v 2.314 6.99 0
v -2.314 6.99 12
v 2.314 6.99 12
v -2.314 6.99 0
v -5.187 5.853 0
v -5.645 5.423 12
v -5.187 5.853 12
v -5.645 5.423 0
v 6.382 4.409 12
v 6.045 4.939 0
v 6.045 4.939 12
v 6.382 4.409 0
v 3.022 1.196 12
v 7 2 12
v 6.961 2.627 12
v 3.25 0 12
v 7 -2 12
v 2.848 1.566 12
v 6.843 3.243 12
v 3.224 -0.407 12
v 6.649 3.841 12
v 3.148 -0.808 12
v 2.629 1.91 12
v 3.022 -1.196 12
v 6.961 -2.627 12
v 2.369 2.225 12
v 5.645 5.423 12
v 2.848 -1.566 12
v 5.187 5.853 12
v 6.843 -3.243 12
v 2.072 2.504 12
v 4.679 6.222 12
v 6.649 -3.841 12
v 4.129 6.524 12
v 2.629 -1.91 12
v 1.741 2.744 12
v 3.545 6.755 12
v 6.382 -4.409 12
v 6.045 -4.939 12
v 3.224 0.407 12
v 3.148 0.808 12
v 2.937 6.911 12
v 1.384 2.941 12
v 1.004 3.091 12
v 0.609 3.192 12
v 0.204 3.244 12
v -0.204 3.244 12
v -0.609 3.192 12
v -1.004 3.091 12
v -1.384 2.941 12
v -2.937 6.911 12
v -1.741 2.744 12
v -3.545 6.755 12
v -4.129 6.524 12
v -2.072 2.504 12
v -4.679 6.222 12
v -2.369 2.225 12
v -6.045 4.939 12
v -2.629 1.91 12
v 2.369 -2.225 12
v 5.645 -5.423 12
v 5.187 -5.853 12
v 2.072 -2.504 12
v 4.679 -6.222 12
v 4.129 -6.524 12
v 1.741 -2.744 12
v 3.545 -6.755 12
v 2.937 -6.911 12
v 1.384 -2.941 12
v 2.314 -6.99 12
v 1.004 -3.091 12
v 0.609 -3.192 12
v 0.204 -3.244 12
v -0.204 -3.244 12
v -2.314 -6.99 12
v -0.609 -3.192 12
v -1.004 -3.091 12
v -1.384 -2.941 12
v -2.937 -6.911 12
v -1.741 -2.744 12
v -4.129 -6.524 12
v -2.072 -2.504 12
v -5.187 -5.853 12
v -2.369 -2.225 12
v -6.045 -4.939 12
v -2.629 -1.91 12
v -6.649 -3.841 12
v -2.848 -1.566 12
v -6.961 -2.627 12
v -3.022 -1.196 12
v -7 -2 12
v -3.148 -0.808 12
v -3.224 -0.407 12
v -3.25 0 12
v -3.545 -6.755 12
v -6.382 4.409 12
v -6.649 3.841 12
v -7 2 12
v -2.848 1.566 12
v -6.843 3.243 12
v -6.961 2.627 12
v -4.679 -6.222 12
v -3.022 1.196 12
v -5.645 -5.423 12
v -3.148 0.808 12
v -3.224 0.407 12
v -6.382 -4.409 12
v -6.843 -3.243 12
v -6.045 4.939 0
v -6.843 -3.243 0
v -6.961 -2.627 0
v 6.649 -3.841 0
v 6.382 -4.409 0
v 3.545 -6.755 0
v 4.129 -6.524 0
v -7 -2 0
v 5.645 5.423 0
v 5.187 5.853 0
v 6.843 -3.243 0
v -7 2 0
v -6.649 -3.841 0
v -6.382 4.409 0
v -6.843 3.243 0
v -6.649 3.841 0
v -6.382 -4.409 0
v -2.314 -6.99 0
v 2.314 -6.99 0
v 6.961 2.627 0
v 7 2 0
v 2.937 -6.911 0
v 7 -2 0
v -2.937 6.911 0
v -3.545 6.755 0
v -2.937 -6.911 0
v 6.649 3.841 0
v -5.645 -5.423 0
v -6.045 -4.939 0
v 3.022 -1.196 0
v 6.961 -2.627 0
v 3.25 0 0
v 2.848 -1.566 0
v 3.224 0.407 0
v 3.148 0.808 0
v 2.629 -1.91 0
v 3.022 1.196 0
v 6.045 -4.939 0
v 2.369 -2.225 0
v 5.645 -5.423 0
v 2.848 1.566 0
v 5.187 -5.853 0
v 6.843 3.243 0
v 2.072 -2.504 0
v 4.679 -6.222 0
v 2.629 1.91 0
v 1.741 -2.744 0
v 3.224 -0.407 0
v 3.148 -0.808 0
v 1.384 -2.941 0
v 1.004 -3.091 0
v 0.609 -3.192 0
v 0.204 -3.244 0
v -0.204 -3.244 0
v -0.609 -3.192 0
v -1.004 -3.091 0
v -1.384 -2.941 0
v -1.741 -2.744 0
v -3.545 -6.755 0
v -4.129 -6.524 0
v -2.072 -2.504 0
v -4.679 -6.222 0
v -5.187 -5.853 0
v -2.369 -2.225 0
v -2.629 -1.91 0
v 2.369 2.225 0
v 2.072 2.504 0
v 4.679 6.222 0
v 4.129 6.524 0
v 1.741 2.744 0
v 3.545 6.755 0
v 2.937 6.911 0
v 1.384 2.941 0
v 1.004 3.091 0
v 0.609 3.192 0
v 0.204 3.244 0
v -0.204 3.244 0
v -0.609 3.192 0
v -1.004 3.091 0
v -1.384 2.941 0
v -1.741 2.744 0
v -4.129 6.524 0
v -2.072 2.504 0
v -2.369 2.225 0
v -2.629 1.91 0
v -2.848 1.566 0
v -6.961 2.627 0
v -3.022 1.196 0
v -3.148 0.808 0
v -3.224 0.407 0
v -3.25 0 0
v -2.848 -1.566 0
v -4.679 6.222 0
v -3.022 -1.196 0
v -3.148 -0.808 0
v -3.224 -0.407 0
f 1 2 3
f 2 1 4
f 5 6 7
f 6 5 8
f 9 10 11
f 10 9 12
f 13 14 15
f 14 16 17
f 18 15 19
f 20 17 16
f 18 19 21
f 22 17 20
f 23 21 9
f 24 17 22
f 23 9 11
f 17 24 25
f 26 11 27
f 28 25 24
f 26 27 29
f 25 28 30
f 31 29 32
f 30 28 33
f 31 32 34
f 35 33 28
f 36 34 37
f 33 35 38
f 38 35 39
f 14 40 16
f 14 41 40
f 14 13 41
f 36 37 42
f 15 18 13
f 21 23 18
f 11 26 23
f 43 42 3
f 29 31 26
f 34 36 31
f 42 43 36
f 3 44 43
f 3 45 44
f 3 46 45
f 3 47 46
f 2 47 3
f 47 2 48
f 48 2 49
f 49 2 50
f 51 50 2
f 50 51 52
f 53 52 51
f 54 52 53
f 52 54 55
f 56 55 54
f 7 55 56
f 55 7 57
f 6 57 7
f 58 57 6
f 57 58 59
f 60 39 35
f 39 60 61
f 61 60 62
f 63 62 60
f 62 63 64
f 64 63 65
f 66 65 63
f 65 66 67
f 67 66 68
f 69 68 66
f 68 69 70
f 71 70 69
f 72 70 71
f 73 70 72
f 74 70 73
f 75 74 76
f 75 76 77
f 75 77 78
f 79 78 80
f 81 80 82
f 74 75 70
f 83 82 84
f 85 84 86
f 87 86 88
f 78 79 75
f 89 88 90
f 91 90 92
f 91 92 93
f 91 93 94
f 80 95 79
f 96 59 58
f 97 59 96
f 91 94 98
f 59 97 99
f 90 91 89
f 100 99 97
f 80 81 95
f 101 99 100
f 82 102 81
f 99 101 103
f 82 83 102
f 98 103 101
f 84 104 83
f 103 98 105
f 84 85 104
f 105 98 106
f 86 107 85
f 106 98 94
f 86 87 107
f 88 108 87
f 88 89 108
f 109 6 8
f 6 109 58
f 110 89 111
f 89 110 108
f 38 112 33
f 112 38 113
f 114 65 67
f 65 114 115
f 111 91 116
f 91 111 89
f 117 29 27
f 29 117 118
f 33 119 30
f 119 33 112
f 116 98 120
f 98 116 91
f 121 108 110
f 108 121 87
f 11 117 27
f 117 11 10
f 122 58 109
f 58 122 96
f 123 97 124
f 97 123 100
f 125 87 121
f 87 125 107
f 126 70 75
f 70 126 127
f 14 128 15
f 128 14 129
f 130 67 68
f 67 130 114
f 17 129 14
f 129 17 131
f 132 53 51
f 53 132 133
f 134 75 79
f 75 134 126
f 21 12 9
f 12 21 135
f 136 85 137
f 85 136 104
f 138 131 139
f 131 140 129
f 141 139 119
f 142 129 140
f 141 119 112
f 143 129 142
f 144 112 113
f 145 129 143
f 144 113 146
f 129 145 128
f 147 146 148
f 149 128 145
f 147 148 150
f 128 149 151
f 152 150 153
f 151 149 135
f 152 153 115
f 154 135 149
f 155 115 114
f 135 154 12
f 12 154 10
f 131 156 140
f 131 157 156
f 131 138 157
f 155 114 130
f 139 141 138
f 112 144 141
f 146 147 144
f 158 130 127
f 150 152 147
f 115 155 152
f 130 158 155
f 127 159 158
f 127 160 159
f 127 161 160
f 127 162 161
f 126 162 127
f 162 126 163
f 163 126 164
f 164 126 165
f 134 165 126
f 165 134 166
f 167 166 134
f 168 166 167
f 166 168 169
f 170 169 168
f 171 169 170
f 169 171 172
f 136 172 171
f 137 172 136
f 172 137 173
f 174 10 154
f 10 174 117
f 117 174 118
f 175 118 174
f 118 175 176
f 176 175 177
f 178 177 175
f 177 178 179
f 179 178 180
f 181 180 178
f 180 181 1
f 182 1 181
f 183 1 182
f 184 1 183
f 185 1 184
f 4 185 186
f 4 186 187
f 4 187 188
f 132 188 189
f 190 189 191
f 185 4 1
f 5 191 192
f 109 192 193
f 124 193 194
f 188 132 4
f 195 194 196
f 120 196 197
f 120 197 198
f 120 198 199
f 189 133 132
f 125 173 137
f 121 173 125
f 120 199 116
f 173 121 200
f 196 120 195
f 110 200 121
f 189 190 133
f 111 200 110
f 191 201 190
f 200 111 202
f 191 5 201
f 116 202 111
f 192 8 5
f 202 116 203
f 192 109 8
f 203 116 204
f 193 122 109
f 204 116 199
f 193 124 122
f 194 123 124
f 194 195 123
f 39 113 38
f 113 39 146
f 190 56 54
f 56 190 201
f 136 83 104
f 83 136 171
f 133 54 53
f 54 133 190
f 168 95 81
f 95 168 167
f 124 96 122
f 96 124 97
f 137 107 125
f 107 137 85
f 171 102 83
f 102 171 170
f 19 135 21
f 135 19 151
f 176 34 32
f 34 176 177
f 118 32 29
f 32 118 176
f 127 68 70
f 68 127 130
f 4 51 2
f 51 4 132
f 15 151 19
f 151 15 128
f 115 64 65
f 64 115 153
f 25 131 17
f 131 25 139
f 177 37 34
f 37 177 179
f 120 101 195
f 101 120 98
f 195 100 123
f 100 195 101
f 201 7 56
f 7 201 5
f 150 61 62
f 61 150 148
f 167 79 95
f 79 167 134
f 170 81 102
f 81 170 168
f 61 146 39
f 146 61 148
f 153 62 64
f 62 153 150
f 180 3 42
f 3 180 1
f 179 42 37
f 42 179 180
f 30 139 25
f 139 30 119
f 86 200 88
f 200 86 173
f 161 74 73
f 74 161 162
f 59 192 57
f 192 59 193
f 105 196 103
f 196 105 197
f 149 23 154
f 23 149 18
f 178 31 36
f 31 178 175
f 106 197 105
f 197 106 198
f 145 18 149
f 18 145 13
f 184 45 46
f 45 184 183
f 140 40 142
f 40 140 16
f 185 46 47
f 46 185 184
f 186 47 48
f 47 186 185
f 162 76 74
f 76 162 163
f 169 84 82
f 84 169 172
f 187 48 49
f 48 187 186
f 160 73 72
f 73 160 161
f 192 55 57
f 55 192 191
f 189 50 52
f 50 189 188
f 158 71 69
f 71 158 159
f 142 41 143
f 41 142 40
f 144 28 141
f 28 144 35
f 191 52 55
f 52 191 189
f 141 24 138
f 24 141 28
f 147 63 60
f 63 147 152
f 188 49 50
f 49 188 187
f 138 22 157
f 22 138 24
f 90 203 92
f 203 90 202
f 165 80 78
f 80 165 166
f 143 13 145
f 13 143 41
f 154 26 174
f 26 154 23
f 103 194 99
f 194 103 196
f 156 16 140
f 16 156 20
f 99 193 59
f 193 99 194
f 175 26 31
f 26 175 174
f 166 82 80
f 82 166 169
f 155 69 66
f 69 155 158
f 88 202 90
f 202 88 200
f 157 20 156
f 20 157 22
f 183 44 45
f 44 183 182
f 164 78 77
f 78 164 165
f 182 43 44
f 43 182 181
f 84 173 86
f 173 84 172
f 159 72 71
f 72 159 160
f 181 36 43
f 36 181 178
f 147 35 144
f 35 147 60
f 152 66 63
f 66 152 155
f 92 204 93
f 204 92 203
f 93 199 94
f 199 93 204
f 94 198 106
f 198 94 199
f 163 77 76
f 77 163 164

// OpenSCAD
// Generated by SolidPython 1.1.3 on 2023-03-12 22:44:02
$fn = 50;


difference() {
	union() {
		translate(v = [0, 0, 0]) {
			rotate(a = [0, 0, 0]) {
				hull() {
					translate(v = [-2.0000000000, 2.0000000000, 0]) {
						rotate(a = [0, 0, 0]) {
							translate(v = [0, 0, 0]) {
								rotate(a = [0, 0, 0]) {
									cylinder(h = 12, r = 5);
								}
							}
						}
					}
					translate(v = [2.0000000000, 2.0000000000, 0]) {
						rotate(a = [0, 0, 0]) {
							translate(v = [0, 0, 0]) {
								rotate(a = [0, 0, 0]) {
									cylinder(h = 12, r = 5);
								}
							}
						}
					}
					translate(v = [-2.0000000000, -2.0000000000, 0]) {
						rotate(a = [0, 0, 0]) {
							translate(v = [0, 0, 0]) {
								rotate(a = [0, 0, 0]) {
									cylinder(h = 12, r = 5);
								}
							}
						}
					}
					translate(v = [2.0000000000, -2.0000000000, 0]) {
						rotate(a = [0, 0, 0]) {
							translate(v = [0, 0, 0]) {
								rotate(a = [0, 0, 0]) {
									cylinder(h = 12, r = 5);
								}
							}
						}
					}
				}
			}
		}
	}
	union() {
		translate(v = [0.0000000000, 0.0000000000, 0]) {
			rotate(a = [0, 0, 0]) {
				translate(v = [0, 0, -50]) {
					rotate(a = [0, 0, 0]) {
						cylinder(h = 100, r = 3.2500000000);
					}
				}
			}
		}
	}
}
/***********************************************
*********      SolidPython code:      **********
************************************************
 
from solid import *
import os
import subprocess

import oomB

import opsc_library_gen

mode = "laser"
#mode = "3d_print"

defined_objects = {}

radius_dict = {}
countersunk_dict = {}


def set_mode(m):
    global mode
    mode = m
    radius_dict['M6'] = 6.5/2
    radius_dict['M3'] = 3.3/2
    if mode == "laser":
        radius_dict['M6'] = 6/2
        radius_dict['M3'] = 3/2

    countersunk_dict['M3'] = {}
    countersunk_dict['M3']['little_rad'] = radius_dict['M3']
    countersunk_dict['M3']['big_rad'] = (5.5+0.6)/2
    if mode == "laser":
        countersunk_dict['M3']['big_rad'] = (4.75+0.6)/2
        countersunk_dict['M3']['little_rad'] = (4.75+0.6)/2

    countersunk_dict['M3']['height'] = 1.7


def opsc_make_object(filename, objects, save_type="none",resolution=50, layers = 1, tilediff = 200, mode="laser", overwrite=True):
    if overwrite or not os.path.exists(filename):
        set_mode(mode)
        save_type = save_type.lower()
        os.makedirs(os.path.dirname(filename), exist_ok=True)
        final_object = opsc_get_object(objects, mode = mode)
        # Save the final object to the specified filename    
        scad_render_to_file(final_object, filename, file_header='$fn = %s;' % resolution, include_orig_code=True)
        if mode == "laser":
            filename_laser = filename.replace(".scad","-flat.scad")
            scad_render_to_file(getLaser(final_object, layers=layers, tilediff=tilediff), filename_laser, file_header='$fn = %s;' % resolution, include_orig_code=True)
            if save_type == "all":
                saveToAll(filename_laser)
            elif save_type == "dxf":
                saveToDxf(filename_laser)
        if save_type == "all":
            saveToAll(filename)
        elif save_type == "dxf":
            saveToDxf(filename)


def opsc_get_object(objects, mode = "laser"):
    # Create the solidpython objects only include the positive objects and if they don't have inclusion or their inclusion is either all or mode
    # Initialize an empty list to store the results
    positive_objects = []

    # Iterate over the "objects" list
    for obj in objects:
        # Check if the current object has a "type" key with a value of "positive"
        if obj['type'] == 'positive':
            # Check if the current object has an "inclusion" key and its value matches "mode",
            # or if the current object does not have an "inclusion" key at all
            if not 'inclusion' in obj or obj['inclusion'] == "all" or obj['inclusion'] == mode:
                # Call the "get_opsc_item" function with the current object as an argument
                opsc_item = get_opsc_item(obj)
                # Add the result to the "positive_objects" list
                positive_objects.append(opsc_item)
# Initialize an empty list to store the results
    negative_objects = []

    # Iterate over the "objects" list
    for obj in objects:
        # Check if the current object has a "type" key with a value of "negative"
        if obj['type'] == 'negative':
            # Check if the current object has an "inclusion" key and its value matches "mode",
            # or if the current object does not have an "inclusion" key at all
            if not 'inclusion' in obj or obj['inclusion'] == "all" or obj['inclusion'] == mode:
                # Call the "get_opsc_item" function with the current object as an argument
                opsc_item = get_opsc_item(obj)
                # Add the result to the "negative_objects" list
                negative_objects.append(opsc_item)
    
    #positive_objects = [get_opsc_item(obj) for obj in objects if obj['type'] == 'positive']
    #negative_objects = [get_opsc_item(obj) for obj in objects if obj['type'] == 'negative']
    # Union the positive objects
    positive_object = union()(*positive_objects)
    # Union the negative objects
    negative_object = union()(*negative_objects)
    # Create the final object by subtracting the negative objects from the positive objects
    return difference()(positive_object, negative_object)

def get_opsc_item(params):
    # A dictionary to map radius string values to numerical values
    #radius_dict = {'small': 5, 'medium': 10, 'large': 15}
    # An array of function names for basic shapes
    basic_shapes = ['cube', 'sphere', 'cylinder']
    
    # An array of function names for other shapes
    other_shapes = ['hole', 'slot', 'rounded_rectangle', 'countersunk']
    


    # Convert radius to r if present, and remove radius from the params dictionary
    if 'radius' in params:
        if isinstance(params['radius'], str):
            # Use the radius_dict to map the radius string value to a numerical value
            params['r'] = radius_dict[params['radius']]
        else:
            params['r'] = params['radius']
        del params['radius']
    

    # Check if the object type is a basic shape
    if params['shape'] in basic_shapes:
        # Remove shape and unexpected dictionary values
        allowed_keys = {'size', 'r', 'r1', 'r2', 'd', 'h', 'rw', 'rh', 'dw', 'dh'}
        shape_params = {k: v for k, v in params.items() if k in allowed_keys}

        # Call the corresponding function for the shape parameter, using ** notation to pass the shape_params dictionary as keyword arguments
        return get_opsc_transform(params,globals()[params['shape']](**shape_params))
    
    # If the object type is not a basic shape, check if it's a defined object or one of the other shapes
    elif params['shape'] in other_shapes:
        # Call the corresponding function for the shape parameter, passing the params dictionary as an argument
        p2 = copy.deepcopy(params)
        p2["pos"] = [0,0,0]
        return get_opsc_transform(params,globals()[params['shape']](p2))
    
    # If the object is not a basic shape or a defined object, try to import it from a .scad file
    else:
        obj = defined_objects[params['shape']]
        return get_opsc_transform(params,obj)

def get_opsc_transform(params, solid_obj):
    # Rotate the object based on the 'rot' field in the params dictionary, or the 'rotX', 'rotY', and 'rotZ' fields if 'rot' is not present
    rot = params.get('rot', [])
    if rot:
        rotX, rotY, rotZ = rot
    else:
        rotX = params.get('rotX', 0)
        rotY = params.get('rotY', 0)
        rotZ = params.get('rotZ', 0)
    solid_obj = rotate([rotX, rotY, rotZ])(solid_obj)

    # Translate the object based on the 'pos' field in the params dictionary, or the 'x', 'y', and 'z' fields if 'pos' is not present
    pos = params.get('pos', [])
    if pos:
        x, y, z = pos
    else:
        x = params.get('x', 0)
        y = params.get('y', 0)
        z = params.get('z', 0)
    solid_obj = translate([x, y, z])(solid_obj)
    return solid_obj


import random

def opsc_easy_array(type, shape, repeats, pos_start, shift_arr, **kwargs):
    for i in range(0,3):
        repeats.append(1)
        pos_start.append(0)
        shift_arr.append(0)
    return_objects = []

    for x in range(0,repeats[0]):
        for y in range(0,repeats[1]):
            for z in range(0,repeats[2]):
                return_objects.append(opsc_easy(type, shape, pos=[pos_start[0]+x*shift_arr[0],pos_start[1]+y*shift_arr[1],pos_start[2]+z*shift_arr[2]], **kwargs))
    return return_objects                



def opsc_easy(type, shape, **kwargs):
    obj = {
        'type': type,
        'shape': shape
    }
    for param in ['size', 'r', 'r1', 'r2', 'd', 'h', 'rw', 'rh', 'dw', 'dh', 'pos', 'x', 'y', 'z', 'rot', 'rotX', 'rotY', 'rotZ', "w", "inclusion"]:
        if param in kwargs:
            obj[param] = kwargs[param]
    return obj

def hole(params):
    p2 = copy.deepcopy(params)  
    # Check if the radius is a string and replace it with the corresponding value from the dictionary
    if isinstance(p2['r'], str):
        p2['r'] = radius_dict[p2['r']]
    
    # Set the height to 100 if not specified
    if 'h' not in p2:
        p2['h'] = 100
        p2["pos"] = [0,0,-50]
    p2["center"] = True
    # Create the cylinder object
    p2["shape"] = "cylinder"
    p2["type"] = "positive"

    return get_opsc_item(p2)

import copy

def countersunk(params):
    p2 = copy.deepcopy(params)
    counter_rad = p2['r']
    p2['r'] = radius_dict[p2['r']]
    hp = copy.deepcopy(p2)
    hp["type"] = "positive"
    hp["shape"] = "hole"
    del hp["rot"]
    hol = get_opsc_item(hp)
    
    cp = copy.deepcopy(p2)
    cp["h"] = countersunk_dict[counter_rad]["height"]
    cp["r2"] = countersunk_dict[counter_rad]["little_rad"]
    cp["r1"] = countersunk_dict[counter_rad]["big_rad"]
    del cp["r"]
    del cp["rot"]
    cp["type"] = "positive"
    cp["shape"] = "cylinder"
    cp["pos"] = [0,0,0]

    top = get_opsc_item(cp)
    return union()(hol,top)



def slot(params):  
    p2 = copy.deepcopy(params) 
    if isinstance(p2['r'], str):
        p2['r'] = radius_dict[p2['r']]
    p2["type"] = "positive"
    p2["shape"] = "hole"
    del p2["rot"]
    p2["pos"] = [0,0,0]
    left = copy.deepcopy(p2)
    right = copy.deepcopy(p2)
    left["pos"][0] = p2["w"] / 2 - p2["r"] 
    
    right["pos"][0] = -p2["w"] / 2 + p2["r"] 
    pass
    leftObj = get_opsc_item(left)
    rightObj = get_opsc_item(right)
    return hull()(leftObj, rightObj)

def rounded_rectangle(params):   
    p2 = copy.deepcopy(params) 
    p2["h"] = p2["size"][2]
    p2["pos"] = p2.get("pos", [0, 0, 0]) 
    p2["type"] = "positive"
    p2["shape"] = "hole"
    p2["pos"] = [0,0,0]
    
    if 'rot' in p2:
        del p2["rot"]   
    if 'r' not in p2:
        p2["r"] = 5 
    tl = copy.deepcopy(p2)
    tr = copy.deepcopy(p2)
    bl = copy.deepcopy(p2)
    br = copy.deepcopy(p2)
    tl["pos"][0] = -(p2["size"][0] - p2["r"]*2)/2
    tl["pos"][1] = (p2["size"][1] - p2["r"]*2)/2
    tr["pos"][0] = (p2["size"][0] - p2["r"]*2)/2
    tr["pos"][1] = (p2["size"][1] - p2["r"]*2)/2
    bl["pos"][0] = -(p2["size"][0] - p2["r"]*2)/2
    bl["pos"][1] = -(p2["size"][1] - p2["r"]*2)/2
    br["pos"][0] = (p2["size"][0] - p2["r"]*2)/2
    br["pos"][1] = -(p2["size"][1] - p2["r"]*2)/2
    del tl["size"]
    del tr["size"]
    del bl["size"]
    del br["size"]
    tlo = get_opsc_item(tl)
    tro = get_opsc_item(tr)
    blo = get_opsc_item(bl)
    bro = get_opsc_item(br)    
    return hull()(tlo, tro, blo, bro)



def import_scad_object(filename):
    # Import the .scad file and convert it to a solidpython object
    #filename = "parts"
    obj = import_scad(filename)
    return obj.main()
    


import os
import solid as solidpython

# A dictionary to store the defined objects


def load_scad_objects():
    opsc_library_gen.gen_library(defined_objects)

import random

def test(num_objects):
    objects = []
    for i in range(num_objects):
        # Choose a random shape
        #shape = random.choice(['cube', 'sphere', 'cylinder', 'hole', 'slot', "rounded_rectangle"])
        shape = random.choice(["rounded_rectangle"])

        # Choose a random type
        type = random.choice(['positive', 'negative'])
        
        # Create an empty object dictionary
        obj = {'shape': shape, 'type': type}
        
        # Set shape-specific parameters
        if obj['shape'] in ['cube']:
            obj['size'] =  [random.uniform(5, 15), random.uniform(5, 15), random.uniform(5, 15)]
        if obj['shape'] in ['rounded_rectangle']:
            obj['size'] =  [random.uniform(5, 15), random.uniform(5, 15), random.uniform(5, 15)]
            obj['r'] = random.uniform(0.5, 5)
        elif obj['shape'] == 'sphere':
            obj['r'] = random.uniform(5, 15)
        elif obj['shape'] in ['cylinder', 'hole']:
            obj['r'] = random.uniform(0.5, 5)
            obj['h'] = random.uniform(5, 15)
        elif obj['shape'] == 'slot':
            obj['r'] = random.uniform(0.5, 5)
            obj['h'] = random.uniform(5, 15)
            obj['w'] = random.uniform(5, 15)
        
        # Set a random position and rotation
        obj['pos'] = [random.uniform(-20, 20), random.uniform(-20, 20), random.uniform(-20, 20)]
        obj['rot'] = [random.uniform(-180, 180), random.uniform(-180, 180), random.uniform(-180, 180)]
        
        # Add the object to the list
        objects.append(obj)
    return objects

####### old file saving
def saveToAll(fileIn):
    saveToDxf(fileIn)
    saveToPng(fileIn)
    saveToStl(fileIn)
    saveToSvg(fileIn)

def saveToDxf(fileIn, fileOut="", copy_to_laser=True):
    if fileOut == "":
        fileOut = fileIn.replace(".scad",".dxf")
    saveToFile(fileIn, fileOut)


    
def saveToPng(fileIn, fileOut="",extra="--render"):
    if fileOut == "":
        fileOut = fileIn.replace(".scad",".png")
    saveToFile(fileIn, fileOut)

def saveToStl(fileIn, fileOut=""):
    if fileOut == "":
        fileOut = fileIn.replace(".scad",".stl")
    saveToFile(fileIn, fileOut)
    
def saveToSvg(fileIn, fileOut=""):
    if fileOut == "":
        fileOut = fileIn.replace(".scad",".svg")
    saveToFile(fileIn, fileOut)

def saveToFile(fileIn, fileOut,extra=""):
    #extra = extra + " --colorscheme Tomorrow"

    launchStr = 'openscad -o "' + fileOut + '"' + extra + ' "' + fileIn + '"'
    if ".png" in fileOut:
        launchStr = launchStr + " --render"
    print("            saveToFile launch string: " + launchStr)
    subprocess.run(launchStr)
    x=0

def getLaser(final_object,start=1.5,layers=1,thickness=3,tilediff=200):
        rv= []

        for x in range(layers):
            rv.append(translate([0,x*tilediff,0])(
                    projection()(
                        intersection()(translate([-500,-500,start+x*thickness])(cube(size=[1000,1000,0.1])),
                            final_object
                        )
                    )
            )
            )
            
        return union()(rv)

set_mode("laser")
load_scad_objects() 
 
************************************************/
